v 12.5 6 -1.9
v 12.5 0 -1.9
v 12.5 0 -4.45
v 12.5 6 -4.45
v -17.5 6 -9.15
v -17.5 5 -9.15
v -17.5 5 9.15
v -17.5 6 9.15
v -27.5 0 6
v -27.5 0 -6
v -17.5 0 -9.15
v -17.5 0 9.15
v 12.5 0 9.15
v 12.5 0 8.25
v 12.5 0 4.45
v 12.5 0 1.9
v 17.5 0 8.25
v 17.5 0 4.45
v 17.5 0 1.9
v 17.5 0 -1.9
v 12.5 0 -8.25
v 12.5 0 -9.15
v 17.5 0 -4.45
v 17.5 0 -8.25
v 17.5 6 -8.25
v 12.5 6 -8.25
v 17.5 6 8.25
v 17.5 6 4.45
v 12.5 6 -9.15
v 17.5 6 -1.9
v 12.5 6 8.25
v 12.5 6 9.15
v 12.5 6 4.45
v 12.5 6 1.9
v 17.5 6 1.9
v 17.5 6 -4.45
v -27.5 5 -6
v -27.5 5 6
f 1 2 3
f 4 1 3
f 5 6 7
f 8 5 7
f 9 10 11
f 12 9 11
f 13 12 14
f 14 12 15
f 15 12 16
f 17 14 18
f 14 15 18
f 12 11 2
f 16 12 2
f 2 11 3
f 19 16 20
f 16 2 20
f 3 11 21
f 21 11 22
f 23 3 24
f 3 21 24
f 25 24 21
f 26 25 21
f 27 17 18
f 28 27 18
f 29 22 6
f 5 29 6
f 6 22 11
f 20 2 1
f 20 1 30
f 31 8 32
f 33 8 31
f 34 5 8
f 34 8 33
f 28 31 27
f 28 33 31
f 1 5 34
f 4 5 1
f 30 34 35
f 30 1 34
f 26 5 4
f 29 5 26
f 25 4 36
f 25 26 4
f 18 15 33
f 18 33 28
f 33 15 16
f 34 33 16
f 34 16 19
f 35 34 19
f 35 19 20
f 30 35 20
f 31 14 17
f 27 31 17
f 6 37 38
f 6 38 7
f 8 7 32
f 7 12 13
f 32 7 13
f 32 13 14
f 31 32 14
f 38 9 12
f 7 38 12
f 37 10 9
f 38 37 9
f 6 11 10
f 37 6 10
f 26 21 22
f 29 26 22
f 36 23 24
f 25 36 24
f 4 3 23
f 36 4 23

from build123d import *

# Parameters (mm, degrees)
SKETCH1_W           = 5
SKETCH1_H           = 3.8
BOSS_EXTRUDE1_DEPTH = 6
BOSS_EXTRUDE2_DEPTH = 5


with BuildPart() as part:
    # Sketch1 → Boss-Extrude1 (new body)
    with BuildSketch(Plane(origin=(0, 0, 0), x_dir=(1, 0, 0), z_dir=(0, 1, 0))):
        Polygon((12.5, 8.25), (12.5, 9.15), (-17.5, 9.15), (-17.5, -9.15), (12.5, -9.15), (12.5, -8.25), (12.5, -4.45), (12.5, -1.9), (12.5, 1.9), (12.5, 4.45), (17.5, 4.45), (17.5, 8.25), align=None)
        with Locations((15, 0)):
            Rectangle(SKETCH1_W, SKETCH1_H)
        with Locations((15, -6.35)):
            Rectangle(SKETCH1_W, SKETCH1_H)
    extrude(amount=BOSS_EXTRUDE1_DEPTH)

    # Sketch2 → Boss-Extrude2 (add)
    with BuildSketch(Plane(origin=(0, 0, 0), x_dir=(1, 0, 0), z_dir=(0, 1, 0))):
        Polygon((-17.5, 0), (-17.5, 9.15), (-27.5, 6), (-27.5, 0), align=None)
        Polygon((-17.5, -9.15), (-17.5, 0), (-27.5, 0), (-27.5, -6), align=None)
    extrude(amount=BOSS_EXTRUDE2_DEPTH)


solid = part.part
